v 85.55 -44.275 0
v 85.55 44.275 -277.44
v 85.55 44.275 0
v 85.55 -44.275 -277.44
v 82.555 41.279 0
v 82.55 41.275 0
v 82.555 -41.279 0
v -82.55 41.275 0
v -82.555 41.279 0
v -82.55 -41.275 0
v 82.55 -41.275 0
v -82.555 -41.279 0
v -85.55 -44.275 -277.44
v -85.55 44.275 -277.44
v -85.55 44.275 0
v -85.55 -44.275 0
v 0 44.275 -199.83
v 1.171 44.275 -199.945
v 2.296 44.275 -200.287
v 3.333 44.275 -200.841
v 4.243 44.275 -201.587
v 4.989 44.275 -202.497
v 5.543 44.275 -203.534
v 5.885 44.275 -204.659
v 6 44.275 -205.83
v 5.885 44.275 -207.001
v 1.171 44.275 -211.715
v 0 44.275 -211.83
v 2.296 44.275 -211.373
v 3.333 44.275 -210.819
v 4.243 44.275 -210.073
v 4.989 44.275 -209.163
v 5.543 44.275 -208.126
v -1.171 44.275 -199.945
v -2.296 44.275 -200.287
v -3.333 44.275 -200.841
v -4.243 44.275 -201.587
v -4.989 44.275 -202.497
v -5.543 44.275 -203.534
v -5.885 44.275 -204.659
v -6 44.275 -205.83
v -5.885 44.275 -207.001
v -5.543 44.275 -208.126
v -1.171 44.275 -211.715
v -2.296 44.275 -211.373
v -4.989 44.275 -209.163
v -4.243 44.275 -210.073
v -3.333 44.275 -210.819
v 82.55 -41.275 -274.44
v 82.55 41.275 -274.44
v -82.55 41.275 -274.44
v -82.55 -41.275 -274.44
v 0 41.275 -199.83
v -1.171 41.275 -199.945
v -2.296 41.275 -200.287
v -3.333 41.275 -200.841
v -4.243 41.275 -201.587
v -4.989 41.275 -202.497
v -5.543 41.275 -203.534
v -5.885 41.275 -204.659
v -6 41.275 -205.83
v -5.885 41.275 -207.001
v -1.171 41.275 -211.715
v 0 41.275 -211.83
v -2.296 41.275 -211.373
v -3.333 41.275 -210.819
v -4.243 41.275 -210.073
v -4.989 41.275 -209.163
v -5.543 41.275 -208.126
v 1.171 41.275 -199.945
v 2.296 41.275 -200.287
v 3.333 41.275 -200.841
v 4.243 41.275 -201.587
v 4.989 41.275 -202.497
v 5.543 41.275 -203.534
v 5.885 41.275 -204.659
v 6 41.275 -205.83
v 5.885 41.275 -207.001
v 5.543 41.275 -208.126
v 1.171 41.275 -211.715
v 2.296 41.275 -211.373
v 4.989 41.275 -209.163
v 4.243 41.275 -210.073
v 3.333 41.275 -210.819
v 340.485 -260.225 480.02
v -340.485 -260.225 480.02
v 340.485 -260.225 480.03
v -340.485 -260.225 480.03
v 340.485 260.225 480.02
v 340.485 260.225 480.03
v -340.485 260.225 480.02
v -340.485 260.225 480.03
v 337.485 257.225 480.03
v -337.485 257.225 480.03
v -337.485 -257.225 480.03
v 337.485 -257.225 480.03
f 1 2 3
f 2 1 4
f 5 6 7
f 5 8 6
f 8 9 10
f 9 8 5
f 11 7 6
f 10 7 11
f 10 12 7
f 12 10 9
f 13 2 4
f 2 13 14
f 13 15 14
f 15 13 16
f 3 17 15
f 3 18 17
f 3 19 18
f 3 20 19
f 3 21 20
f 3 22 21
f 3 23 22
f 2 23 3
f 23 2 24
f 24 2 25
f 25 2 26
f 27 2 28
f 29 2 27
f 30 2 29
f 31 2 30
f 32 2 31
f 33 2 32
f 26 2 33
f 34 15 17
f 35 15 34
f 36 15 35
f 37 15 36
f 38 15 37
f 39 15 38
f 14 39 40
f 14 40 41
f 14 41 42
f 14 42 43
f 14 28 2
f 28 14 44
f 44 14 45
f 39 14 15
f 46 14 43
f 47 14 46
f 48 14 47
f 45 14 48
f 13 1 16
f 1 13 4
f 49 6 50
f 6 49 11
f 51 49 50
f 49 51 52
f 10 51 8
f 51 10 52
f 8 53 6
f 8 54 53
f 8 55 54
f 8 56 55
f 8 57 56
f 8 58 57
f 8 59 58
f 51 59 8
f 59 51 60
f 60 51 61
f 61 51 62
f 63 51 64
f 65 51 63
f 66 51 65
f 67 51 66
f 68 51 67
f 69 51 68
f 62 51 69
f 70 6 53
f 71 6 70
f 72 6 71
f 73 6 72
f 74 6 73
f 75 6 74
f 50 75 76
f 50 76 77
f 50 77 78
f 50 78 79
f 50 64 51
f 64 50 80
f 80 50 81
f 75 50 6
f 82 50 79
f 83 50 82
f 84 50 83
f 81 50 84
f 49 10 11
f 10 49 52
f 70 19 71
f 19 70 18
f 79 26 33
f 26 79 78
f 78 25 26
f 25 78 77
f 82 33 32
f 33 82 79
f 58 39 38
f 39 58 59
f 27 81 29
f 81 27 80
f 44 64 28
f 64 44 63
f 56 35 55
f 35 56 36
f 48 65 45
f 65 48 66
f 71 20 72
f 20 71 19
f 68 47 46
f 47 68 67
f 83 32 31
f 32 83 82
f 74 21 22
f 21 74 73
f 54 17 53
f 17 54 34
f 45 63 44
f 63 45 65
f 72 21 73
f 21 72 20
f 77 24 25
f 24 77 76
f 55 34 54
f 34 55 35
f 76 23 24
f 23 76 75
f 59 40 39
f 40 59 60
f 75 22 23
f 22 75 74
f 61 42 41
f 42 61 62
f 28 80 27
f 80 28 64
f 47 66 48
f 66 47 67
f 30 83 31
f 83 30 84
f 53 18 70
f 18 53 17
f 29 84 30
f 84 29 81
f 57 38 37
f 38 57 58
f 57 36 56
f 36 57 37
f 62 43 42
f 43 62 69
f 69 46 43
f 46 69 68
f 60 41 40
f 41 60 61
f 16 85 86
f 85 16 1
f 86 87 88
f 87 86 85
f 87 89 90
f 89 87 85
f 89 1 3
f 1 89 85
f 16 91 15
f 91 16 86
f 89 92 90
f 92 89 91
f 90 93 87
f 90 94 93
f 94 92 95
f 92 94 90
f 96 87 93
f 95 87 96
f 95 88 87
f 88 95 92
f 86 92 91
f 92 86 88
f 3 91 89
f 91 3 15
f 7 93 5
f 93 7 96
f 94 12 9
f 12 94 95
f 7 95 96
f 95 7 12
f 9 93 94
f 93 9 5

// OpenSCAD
// file: horn_params.scad
// generated by tools/horn_design.py for 17.0 dBi at 1420.405752 MHz
corner_angle = 101.09;  // interior angle between adjacent flare walls
a = 165.10;
b = 82.55;
a1 = 674.97;
b1 = 514.45;
pe = 480.02;
lam = 211.06;
lam_g = 274.44;
probe_len = 50.13;
probe_from_back = 68.61;
guide_len = 274.44;
// main file
// Cosmic Library - 21 cm hydrogen-line pyramidal horn (dimensions from tools/horn_design.py)
// ---------------------------------------------------------------------------
// PART = "horn"         the whole horn as a thin shell - a PREVIEW / fit-check model, far too big to
//                       print (build it from foam board + aluminium tape using images/horn-cutting-diagram.svg)
//        "probe_jig"    printable gauge: marks the probe hole lambda_g/4 from the back plate and checks
//                       the probe length
// License: CERN-OHL-P-2.0
include <horn_params.scad>

PART = "horn";
t = 3;          // preview wall thickness

module frustum(w0, h0, w1, h1, len) {
    hull() {
        translate([-w0 / 2, -h0 / 2, 0]) cube([w0, h0, 0.01]);
        translate([-w1 / 2, -h1 / 2, len]) cube([w1, h1, 0.01]);
    }
}

module horn() {
    // waveguide section (z < 0), closed at the back
    difference() {
        translate([-a / 2 - t, -b / 2 - t, -guide_len - t]) cube([a + 2 * t, b + 2 * t, guide_len + t]);
        translate([-a / 2, -b / 2, -guide_len]) cube([a, b, guide_len + 1]);
        // probe hole in the broad wall
        translate([0, b / 2 - 1, -guide_len + probe_from_back]) rotate([-90, 0, 0]) cylinder(d = 12, h = t + 2, $fn = 32);
    }
    // flare
    difference() {
        frustum(a + 2 * t, b + 2 * t, a1 + 2 * t, b1 + 2 * t, pe);
        translate([0, 0, -0.01]) frustum(a, b, a1, b1, pe + 0.02);
    }
}

module probe_jig() {
    // strip that butts against the inside of the back plate; the hole marks the probe centre,
    // the notch at the other end is exactly probe_len deep for checking the cut probe
    w = 20; h = 3;
    difference() {
        union() {
            cube([probe_from_back + 15, w, h]);
            translate([-4, 0, 0]) cube([4, w, 12]);  // stop that rests against the back plate
        }
        translate([probe_from_back, w / 2, -1]) cylinder(d = 3, h = h + 2, $fn = 24);
        translate([probe_from_back + 6, w / 2 - 1.1, -1]) cube([10, 2.2, h + 2]);
    }
    translate([0, w + 5, 0]) difference() {
        cube([probe_len + 10, 14, 6]);
        translate([10, 7 - 0.9, 3]) cube([probe_len + 1, 1.8, 4]);  // lay the probe in: flush = correct length
    }
}

if (PART == "horn") horn();
else if (PART == "probe_jig") probe_jig();
